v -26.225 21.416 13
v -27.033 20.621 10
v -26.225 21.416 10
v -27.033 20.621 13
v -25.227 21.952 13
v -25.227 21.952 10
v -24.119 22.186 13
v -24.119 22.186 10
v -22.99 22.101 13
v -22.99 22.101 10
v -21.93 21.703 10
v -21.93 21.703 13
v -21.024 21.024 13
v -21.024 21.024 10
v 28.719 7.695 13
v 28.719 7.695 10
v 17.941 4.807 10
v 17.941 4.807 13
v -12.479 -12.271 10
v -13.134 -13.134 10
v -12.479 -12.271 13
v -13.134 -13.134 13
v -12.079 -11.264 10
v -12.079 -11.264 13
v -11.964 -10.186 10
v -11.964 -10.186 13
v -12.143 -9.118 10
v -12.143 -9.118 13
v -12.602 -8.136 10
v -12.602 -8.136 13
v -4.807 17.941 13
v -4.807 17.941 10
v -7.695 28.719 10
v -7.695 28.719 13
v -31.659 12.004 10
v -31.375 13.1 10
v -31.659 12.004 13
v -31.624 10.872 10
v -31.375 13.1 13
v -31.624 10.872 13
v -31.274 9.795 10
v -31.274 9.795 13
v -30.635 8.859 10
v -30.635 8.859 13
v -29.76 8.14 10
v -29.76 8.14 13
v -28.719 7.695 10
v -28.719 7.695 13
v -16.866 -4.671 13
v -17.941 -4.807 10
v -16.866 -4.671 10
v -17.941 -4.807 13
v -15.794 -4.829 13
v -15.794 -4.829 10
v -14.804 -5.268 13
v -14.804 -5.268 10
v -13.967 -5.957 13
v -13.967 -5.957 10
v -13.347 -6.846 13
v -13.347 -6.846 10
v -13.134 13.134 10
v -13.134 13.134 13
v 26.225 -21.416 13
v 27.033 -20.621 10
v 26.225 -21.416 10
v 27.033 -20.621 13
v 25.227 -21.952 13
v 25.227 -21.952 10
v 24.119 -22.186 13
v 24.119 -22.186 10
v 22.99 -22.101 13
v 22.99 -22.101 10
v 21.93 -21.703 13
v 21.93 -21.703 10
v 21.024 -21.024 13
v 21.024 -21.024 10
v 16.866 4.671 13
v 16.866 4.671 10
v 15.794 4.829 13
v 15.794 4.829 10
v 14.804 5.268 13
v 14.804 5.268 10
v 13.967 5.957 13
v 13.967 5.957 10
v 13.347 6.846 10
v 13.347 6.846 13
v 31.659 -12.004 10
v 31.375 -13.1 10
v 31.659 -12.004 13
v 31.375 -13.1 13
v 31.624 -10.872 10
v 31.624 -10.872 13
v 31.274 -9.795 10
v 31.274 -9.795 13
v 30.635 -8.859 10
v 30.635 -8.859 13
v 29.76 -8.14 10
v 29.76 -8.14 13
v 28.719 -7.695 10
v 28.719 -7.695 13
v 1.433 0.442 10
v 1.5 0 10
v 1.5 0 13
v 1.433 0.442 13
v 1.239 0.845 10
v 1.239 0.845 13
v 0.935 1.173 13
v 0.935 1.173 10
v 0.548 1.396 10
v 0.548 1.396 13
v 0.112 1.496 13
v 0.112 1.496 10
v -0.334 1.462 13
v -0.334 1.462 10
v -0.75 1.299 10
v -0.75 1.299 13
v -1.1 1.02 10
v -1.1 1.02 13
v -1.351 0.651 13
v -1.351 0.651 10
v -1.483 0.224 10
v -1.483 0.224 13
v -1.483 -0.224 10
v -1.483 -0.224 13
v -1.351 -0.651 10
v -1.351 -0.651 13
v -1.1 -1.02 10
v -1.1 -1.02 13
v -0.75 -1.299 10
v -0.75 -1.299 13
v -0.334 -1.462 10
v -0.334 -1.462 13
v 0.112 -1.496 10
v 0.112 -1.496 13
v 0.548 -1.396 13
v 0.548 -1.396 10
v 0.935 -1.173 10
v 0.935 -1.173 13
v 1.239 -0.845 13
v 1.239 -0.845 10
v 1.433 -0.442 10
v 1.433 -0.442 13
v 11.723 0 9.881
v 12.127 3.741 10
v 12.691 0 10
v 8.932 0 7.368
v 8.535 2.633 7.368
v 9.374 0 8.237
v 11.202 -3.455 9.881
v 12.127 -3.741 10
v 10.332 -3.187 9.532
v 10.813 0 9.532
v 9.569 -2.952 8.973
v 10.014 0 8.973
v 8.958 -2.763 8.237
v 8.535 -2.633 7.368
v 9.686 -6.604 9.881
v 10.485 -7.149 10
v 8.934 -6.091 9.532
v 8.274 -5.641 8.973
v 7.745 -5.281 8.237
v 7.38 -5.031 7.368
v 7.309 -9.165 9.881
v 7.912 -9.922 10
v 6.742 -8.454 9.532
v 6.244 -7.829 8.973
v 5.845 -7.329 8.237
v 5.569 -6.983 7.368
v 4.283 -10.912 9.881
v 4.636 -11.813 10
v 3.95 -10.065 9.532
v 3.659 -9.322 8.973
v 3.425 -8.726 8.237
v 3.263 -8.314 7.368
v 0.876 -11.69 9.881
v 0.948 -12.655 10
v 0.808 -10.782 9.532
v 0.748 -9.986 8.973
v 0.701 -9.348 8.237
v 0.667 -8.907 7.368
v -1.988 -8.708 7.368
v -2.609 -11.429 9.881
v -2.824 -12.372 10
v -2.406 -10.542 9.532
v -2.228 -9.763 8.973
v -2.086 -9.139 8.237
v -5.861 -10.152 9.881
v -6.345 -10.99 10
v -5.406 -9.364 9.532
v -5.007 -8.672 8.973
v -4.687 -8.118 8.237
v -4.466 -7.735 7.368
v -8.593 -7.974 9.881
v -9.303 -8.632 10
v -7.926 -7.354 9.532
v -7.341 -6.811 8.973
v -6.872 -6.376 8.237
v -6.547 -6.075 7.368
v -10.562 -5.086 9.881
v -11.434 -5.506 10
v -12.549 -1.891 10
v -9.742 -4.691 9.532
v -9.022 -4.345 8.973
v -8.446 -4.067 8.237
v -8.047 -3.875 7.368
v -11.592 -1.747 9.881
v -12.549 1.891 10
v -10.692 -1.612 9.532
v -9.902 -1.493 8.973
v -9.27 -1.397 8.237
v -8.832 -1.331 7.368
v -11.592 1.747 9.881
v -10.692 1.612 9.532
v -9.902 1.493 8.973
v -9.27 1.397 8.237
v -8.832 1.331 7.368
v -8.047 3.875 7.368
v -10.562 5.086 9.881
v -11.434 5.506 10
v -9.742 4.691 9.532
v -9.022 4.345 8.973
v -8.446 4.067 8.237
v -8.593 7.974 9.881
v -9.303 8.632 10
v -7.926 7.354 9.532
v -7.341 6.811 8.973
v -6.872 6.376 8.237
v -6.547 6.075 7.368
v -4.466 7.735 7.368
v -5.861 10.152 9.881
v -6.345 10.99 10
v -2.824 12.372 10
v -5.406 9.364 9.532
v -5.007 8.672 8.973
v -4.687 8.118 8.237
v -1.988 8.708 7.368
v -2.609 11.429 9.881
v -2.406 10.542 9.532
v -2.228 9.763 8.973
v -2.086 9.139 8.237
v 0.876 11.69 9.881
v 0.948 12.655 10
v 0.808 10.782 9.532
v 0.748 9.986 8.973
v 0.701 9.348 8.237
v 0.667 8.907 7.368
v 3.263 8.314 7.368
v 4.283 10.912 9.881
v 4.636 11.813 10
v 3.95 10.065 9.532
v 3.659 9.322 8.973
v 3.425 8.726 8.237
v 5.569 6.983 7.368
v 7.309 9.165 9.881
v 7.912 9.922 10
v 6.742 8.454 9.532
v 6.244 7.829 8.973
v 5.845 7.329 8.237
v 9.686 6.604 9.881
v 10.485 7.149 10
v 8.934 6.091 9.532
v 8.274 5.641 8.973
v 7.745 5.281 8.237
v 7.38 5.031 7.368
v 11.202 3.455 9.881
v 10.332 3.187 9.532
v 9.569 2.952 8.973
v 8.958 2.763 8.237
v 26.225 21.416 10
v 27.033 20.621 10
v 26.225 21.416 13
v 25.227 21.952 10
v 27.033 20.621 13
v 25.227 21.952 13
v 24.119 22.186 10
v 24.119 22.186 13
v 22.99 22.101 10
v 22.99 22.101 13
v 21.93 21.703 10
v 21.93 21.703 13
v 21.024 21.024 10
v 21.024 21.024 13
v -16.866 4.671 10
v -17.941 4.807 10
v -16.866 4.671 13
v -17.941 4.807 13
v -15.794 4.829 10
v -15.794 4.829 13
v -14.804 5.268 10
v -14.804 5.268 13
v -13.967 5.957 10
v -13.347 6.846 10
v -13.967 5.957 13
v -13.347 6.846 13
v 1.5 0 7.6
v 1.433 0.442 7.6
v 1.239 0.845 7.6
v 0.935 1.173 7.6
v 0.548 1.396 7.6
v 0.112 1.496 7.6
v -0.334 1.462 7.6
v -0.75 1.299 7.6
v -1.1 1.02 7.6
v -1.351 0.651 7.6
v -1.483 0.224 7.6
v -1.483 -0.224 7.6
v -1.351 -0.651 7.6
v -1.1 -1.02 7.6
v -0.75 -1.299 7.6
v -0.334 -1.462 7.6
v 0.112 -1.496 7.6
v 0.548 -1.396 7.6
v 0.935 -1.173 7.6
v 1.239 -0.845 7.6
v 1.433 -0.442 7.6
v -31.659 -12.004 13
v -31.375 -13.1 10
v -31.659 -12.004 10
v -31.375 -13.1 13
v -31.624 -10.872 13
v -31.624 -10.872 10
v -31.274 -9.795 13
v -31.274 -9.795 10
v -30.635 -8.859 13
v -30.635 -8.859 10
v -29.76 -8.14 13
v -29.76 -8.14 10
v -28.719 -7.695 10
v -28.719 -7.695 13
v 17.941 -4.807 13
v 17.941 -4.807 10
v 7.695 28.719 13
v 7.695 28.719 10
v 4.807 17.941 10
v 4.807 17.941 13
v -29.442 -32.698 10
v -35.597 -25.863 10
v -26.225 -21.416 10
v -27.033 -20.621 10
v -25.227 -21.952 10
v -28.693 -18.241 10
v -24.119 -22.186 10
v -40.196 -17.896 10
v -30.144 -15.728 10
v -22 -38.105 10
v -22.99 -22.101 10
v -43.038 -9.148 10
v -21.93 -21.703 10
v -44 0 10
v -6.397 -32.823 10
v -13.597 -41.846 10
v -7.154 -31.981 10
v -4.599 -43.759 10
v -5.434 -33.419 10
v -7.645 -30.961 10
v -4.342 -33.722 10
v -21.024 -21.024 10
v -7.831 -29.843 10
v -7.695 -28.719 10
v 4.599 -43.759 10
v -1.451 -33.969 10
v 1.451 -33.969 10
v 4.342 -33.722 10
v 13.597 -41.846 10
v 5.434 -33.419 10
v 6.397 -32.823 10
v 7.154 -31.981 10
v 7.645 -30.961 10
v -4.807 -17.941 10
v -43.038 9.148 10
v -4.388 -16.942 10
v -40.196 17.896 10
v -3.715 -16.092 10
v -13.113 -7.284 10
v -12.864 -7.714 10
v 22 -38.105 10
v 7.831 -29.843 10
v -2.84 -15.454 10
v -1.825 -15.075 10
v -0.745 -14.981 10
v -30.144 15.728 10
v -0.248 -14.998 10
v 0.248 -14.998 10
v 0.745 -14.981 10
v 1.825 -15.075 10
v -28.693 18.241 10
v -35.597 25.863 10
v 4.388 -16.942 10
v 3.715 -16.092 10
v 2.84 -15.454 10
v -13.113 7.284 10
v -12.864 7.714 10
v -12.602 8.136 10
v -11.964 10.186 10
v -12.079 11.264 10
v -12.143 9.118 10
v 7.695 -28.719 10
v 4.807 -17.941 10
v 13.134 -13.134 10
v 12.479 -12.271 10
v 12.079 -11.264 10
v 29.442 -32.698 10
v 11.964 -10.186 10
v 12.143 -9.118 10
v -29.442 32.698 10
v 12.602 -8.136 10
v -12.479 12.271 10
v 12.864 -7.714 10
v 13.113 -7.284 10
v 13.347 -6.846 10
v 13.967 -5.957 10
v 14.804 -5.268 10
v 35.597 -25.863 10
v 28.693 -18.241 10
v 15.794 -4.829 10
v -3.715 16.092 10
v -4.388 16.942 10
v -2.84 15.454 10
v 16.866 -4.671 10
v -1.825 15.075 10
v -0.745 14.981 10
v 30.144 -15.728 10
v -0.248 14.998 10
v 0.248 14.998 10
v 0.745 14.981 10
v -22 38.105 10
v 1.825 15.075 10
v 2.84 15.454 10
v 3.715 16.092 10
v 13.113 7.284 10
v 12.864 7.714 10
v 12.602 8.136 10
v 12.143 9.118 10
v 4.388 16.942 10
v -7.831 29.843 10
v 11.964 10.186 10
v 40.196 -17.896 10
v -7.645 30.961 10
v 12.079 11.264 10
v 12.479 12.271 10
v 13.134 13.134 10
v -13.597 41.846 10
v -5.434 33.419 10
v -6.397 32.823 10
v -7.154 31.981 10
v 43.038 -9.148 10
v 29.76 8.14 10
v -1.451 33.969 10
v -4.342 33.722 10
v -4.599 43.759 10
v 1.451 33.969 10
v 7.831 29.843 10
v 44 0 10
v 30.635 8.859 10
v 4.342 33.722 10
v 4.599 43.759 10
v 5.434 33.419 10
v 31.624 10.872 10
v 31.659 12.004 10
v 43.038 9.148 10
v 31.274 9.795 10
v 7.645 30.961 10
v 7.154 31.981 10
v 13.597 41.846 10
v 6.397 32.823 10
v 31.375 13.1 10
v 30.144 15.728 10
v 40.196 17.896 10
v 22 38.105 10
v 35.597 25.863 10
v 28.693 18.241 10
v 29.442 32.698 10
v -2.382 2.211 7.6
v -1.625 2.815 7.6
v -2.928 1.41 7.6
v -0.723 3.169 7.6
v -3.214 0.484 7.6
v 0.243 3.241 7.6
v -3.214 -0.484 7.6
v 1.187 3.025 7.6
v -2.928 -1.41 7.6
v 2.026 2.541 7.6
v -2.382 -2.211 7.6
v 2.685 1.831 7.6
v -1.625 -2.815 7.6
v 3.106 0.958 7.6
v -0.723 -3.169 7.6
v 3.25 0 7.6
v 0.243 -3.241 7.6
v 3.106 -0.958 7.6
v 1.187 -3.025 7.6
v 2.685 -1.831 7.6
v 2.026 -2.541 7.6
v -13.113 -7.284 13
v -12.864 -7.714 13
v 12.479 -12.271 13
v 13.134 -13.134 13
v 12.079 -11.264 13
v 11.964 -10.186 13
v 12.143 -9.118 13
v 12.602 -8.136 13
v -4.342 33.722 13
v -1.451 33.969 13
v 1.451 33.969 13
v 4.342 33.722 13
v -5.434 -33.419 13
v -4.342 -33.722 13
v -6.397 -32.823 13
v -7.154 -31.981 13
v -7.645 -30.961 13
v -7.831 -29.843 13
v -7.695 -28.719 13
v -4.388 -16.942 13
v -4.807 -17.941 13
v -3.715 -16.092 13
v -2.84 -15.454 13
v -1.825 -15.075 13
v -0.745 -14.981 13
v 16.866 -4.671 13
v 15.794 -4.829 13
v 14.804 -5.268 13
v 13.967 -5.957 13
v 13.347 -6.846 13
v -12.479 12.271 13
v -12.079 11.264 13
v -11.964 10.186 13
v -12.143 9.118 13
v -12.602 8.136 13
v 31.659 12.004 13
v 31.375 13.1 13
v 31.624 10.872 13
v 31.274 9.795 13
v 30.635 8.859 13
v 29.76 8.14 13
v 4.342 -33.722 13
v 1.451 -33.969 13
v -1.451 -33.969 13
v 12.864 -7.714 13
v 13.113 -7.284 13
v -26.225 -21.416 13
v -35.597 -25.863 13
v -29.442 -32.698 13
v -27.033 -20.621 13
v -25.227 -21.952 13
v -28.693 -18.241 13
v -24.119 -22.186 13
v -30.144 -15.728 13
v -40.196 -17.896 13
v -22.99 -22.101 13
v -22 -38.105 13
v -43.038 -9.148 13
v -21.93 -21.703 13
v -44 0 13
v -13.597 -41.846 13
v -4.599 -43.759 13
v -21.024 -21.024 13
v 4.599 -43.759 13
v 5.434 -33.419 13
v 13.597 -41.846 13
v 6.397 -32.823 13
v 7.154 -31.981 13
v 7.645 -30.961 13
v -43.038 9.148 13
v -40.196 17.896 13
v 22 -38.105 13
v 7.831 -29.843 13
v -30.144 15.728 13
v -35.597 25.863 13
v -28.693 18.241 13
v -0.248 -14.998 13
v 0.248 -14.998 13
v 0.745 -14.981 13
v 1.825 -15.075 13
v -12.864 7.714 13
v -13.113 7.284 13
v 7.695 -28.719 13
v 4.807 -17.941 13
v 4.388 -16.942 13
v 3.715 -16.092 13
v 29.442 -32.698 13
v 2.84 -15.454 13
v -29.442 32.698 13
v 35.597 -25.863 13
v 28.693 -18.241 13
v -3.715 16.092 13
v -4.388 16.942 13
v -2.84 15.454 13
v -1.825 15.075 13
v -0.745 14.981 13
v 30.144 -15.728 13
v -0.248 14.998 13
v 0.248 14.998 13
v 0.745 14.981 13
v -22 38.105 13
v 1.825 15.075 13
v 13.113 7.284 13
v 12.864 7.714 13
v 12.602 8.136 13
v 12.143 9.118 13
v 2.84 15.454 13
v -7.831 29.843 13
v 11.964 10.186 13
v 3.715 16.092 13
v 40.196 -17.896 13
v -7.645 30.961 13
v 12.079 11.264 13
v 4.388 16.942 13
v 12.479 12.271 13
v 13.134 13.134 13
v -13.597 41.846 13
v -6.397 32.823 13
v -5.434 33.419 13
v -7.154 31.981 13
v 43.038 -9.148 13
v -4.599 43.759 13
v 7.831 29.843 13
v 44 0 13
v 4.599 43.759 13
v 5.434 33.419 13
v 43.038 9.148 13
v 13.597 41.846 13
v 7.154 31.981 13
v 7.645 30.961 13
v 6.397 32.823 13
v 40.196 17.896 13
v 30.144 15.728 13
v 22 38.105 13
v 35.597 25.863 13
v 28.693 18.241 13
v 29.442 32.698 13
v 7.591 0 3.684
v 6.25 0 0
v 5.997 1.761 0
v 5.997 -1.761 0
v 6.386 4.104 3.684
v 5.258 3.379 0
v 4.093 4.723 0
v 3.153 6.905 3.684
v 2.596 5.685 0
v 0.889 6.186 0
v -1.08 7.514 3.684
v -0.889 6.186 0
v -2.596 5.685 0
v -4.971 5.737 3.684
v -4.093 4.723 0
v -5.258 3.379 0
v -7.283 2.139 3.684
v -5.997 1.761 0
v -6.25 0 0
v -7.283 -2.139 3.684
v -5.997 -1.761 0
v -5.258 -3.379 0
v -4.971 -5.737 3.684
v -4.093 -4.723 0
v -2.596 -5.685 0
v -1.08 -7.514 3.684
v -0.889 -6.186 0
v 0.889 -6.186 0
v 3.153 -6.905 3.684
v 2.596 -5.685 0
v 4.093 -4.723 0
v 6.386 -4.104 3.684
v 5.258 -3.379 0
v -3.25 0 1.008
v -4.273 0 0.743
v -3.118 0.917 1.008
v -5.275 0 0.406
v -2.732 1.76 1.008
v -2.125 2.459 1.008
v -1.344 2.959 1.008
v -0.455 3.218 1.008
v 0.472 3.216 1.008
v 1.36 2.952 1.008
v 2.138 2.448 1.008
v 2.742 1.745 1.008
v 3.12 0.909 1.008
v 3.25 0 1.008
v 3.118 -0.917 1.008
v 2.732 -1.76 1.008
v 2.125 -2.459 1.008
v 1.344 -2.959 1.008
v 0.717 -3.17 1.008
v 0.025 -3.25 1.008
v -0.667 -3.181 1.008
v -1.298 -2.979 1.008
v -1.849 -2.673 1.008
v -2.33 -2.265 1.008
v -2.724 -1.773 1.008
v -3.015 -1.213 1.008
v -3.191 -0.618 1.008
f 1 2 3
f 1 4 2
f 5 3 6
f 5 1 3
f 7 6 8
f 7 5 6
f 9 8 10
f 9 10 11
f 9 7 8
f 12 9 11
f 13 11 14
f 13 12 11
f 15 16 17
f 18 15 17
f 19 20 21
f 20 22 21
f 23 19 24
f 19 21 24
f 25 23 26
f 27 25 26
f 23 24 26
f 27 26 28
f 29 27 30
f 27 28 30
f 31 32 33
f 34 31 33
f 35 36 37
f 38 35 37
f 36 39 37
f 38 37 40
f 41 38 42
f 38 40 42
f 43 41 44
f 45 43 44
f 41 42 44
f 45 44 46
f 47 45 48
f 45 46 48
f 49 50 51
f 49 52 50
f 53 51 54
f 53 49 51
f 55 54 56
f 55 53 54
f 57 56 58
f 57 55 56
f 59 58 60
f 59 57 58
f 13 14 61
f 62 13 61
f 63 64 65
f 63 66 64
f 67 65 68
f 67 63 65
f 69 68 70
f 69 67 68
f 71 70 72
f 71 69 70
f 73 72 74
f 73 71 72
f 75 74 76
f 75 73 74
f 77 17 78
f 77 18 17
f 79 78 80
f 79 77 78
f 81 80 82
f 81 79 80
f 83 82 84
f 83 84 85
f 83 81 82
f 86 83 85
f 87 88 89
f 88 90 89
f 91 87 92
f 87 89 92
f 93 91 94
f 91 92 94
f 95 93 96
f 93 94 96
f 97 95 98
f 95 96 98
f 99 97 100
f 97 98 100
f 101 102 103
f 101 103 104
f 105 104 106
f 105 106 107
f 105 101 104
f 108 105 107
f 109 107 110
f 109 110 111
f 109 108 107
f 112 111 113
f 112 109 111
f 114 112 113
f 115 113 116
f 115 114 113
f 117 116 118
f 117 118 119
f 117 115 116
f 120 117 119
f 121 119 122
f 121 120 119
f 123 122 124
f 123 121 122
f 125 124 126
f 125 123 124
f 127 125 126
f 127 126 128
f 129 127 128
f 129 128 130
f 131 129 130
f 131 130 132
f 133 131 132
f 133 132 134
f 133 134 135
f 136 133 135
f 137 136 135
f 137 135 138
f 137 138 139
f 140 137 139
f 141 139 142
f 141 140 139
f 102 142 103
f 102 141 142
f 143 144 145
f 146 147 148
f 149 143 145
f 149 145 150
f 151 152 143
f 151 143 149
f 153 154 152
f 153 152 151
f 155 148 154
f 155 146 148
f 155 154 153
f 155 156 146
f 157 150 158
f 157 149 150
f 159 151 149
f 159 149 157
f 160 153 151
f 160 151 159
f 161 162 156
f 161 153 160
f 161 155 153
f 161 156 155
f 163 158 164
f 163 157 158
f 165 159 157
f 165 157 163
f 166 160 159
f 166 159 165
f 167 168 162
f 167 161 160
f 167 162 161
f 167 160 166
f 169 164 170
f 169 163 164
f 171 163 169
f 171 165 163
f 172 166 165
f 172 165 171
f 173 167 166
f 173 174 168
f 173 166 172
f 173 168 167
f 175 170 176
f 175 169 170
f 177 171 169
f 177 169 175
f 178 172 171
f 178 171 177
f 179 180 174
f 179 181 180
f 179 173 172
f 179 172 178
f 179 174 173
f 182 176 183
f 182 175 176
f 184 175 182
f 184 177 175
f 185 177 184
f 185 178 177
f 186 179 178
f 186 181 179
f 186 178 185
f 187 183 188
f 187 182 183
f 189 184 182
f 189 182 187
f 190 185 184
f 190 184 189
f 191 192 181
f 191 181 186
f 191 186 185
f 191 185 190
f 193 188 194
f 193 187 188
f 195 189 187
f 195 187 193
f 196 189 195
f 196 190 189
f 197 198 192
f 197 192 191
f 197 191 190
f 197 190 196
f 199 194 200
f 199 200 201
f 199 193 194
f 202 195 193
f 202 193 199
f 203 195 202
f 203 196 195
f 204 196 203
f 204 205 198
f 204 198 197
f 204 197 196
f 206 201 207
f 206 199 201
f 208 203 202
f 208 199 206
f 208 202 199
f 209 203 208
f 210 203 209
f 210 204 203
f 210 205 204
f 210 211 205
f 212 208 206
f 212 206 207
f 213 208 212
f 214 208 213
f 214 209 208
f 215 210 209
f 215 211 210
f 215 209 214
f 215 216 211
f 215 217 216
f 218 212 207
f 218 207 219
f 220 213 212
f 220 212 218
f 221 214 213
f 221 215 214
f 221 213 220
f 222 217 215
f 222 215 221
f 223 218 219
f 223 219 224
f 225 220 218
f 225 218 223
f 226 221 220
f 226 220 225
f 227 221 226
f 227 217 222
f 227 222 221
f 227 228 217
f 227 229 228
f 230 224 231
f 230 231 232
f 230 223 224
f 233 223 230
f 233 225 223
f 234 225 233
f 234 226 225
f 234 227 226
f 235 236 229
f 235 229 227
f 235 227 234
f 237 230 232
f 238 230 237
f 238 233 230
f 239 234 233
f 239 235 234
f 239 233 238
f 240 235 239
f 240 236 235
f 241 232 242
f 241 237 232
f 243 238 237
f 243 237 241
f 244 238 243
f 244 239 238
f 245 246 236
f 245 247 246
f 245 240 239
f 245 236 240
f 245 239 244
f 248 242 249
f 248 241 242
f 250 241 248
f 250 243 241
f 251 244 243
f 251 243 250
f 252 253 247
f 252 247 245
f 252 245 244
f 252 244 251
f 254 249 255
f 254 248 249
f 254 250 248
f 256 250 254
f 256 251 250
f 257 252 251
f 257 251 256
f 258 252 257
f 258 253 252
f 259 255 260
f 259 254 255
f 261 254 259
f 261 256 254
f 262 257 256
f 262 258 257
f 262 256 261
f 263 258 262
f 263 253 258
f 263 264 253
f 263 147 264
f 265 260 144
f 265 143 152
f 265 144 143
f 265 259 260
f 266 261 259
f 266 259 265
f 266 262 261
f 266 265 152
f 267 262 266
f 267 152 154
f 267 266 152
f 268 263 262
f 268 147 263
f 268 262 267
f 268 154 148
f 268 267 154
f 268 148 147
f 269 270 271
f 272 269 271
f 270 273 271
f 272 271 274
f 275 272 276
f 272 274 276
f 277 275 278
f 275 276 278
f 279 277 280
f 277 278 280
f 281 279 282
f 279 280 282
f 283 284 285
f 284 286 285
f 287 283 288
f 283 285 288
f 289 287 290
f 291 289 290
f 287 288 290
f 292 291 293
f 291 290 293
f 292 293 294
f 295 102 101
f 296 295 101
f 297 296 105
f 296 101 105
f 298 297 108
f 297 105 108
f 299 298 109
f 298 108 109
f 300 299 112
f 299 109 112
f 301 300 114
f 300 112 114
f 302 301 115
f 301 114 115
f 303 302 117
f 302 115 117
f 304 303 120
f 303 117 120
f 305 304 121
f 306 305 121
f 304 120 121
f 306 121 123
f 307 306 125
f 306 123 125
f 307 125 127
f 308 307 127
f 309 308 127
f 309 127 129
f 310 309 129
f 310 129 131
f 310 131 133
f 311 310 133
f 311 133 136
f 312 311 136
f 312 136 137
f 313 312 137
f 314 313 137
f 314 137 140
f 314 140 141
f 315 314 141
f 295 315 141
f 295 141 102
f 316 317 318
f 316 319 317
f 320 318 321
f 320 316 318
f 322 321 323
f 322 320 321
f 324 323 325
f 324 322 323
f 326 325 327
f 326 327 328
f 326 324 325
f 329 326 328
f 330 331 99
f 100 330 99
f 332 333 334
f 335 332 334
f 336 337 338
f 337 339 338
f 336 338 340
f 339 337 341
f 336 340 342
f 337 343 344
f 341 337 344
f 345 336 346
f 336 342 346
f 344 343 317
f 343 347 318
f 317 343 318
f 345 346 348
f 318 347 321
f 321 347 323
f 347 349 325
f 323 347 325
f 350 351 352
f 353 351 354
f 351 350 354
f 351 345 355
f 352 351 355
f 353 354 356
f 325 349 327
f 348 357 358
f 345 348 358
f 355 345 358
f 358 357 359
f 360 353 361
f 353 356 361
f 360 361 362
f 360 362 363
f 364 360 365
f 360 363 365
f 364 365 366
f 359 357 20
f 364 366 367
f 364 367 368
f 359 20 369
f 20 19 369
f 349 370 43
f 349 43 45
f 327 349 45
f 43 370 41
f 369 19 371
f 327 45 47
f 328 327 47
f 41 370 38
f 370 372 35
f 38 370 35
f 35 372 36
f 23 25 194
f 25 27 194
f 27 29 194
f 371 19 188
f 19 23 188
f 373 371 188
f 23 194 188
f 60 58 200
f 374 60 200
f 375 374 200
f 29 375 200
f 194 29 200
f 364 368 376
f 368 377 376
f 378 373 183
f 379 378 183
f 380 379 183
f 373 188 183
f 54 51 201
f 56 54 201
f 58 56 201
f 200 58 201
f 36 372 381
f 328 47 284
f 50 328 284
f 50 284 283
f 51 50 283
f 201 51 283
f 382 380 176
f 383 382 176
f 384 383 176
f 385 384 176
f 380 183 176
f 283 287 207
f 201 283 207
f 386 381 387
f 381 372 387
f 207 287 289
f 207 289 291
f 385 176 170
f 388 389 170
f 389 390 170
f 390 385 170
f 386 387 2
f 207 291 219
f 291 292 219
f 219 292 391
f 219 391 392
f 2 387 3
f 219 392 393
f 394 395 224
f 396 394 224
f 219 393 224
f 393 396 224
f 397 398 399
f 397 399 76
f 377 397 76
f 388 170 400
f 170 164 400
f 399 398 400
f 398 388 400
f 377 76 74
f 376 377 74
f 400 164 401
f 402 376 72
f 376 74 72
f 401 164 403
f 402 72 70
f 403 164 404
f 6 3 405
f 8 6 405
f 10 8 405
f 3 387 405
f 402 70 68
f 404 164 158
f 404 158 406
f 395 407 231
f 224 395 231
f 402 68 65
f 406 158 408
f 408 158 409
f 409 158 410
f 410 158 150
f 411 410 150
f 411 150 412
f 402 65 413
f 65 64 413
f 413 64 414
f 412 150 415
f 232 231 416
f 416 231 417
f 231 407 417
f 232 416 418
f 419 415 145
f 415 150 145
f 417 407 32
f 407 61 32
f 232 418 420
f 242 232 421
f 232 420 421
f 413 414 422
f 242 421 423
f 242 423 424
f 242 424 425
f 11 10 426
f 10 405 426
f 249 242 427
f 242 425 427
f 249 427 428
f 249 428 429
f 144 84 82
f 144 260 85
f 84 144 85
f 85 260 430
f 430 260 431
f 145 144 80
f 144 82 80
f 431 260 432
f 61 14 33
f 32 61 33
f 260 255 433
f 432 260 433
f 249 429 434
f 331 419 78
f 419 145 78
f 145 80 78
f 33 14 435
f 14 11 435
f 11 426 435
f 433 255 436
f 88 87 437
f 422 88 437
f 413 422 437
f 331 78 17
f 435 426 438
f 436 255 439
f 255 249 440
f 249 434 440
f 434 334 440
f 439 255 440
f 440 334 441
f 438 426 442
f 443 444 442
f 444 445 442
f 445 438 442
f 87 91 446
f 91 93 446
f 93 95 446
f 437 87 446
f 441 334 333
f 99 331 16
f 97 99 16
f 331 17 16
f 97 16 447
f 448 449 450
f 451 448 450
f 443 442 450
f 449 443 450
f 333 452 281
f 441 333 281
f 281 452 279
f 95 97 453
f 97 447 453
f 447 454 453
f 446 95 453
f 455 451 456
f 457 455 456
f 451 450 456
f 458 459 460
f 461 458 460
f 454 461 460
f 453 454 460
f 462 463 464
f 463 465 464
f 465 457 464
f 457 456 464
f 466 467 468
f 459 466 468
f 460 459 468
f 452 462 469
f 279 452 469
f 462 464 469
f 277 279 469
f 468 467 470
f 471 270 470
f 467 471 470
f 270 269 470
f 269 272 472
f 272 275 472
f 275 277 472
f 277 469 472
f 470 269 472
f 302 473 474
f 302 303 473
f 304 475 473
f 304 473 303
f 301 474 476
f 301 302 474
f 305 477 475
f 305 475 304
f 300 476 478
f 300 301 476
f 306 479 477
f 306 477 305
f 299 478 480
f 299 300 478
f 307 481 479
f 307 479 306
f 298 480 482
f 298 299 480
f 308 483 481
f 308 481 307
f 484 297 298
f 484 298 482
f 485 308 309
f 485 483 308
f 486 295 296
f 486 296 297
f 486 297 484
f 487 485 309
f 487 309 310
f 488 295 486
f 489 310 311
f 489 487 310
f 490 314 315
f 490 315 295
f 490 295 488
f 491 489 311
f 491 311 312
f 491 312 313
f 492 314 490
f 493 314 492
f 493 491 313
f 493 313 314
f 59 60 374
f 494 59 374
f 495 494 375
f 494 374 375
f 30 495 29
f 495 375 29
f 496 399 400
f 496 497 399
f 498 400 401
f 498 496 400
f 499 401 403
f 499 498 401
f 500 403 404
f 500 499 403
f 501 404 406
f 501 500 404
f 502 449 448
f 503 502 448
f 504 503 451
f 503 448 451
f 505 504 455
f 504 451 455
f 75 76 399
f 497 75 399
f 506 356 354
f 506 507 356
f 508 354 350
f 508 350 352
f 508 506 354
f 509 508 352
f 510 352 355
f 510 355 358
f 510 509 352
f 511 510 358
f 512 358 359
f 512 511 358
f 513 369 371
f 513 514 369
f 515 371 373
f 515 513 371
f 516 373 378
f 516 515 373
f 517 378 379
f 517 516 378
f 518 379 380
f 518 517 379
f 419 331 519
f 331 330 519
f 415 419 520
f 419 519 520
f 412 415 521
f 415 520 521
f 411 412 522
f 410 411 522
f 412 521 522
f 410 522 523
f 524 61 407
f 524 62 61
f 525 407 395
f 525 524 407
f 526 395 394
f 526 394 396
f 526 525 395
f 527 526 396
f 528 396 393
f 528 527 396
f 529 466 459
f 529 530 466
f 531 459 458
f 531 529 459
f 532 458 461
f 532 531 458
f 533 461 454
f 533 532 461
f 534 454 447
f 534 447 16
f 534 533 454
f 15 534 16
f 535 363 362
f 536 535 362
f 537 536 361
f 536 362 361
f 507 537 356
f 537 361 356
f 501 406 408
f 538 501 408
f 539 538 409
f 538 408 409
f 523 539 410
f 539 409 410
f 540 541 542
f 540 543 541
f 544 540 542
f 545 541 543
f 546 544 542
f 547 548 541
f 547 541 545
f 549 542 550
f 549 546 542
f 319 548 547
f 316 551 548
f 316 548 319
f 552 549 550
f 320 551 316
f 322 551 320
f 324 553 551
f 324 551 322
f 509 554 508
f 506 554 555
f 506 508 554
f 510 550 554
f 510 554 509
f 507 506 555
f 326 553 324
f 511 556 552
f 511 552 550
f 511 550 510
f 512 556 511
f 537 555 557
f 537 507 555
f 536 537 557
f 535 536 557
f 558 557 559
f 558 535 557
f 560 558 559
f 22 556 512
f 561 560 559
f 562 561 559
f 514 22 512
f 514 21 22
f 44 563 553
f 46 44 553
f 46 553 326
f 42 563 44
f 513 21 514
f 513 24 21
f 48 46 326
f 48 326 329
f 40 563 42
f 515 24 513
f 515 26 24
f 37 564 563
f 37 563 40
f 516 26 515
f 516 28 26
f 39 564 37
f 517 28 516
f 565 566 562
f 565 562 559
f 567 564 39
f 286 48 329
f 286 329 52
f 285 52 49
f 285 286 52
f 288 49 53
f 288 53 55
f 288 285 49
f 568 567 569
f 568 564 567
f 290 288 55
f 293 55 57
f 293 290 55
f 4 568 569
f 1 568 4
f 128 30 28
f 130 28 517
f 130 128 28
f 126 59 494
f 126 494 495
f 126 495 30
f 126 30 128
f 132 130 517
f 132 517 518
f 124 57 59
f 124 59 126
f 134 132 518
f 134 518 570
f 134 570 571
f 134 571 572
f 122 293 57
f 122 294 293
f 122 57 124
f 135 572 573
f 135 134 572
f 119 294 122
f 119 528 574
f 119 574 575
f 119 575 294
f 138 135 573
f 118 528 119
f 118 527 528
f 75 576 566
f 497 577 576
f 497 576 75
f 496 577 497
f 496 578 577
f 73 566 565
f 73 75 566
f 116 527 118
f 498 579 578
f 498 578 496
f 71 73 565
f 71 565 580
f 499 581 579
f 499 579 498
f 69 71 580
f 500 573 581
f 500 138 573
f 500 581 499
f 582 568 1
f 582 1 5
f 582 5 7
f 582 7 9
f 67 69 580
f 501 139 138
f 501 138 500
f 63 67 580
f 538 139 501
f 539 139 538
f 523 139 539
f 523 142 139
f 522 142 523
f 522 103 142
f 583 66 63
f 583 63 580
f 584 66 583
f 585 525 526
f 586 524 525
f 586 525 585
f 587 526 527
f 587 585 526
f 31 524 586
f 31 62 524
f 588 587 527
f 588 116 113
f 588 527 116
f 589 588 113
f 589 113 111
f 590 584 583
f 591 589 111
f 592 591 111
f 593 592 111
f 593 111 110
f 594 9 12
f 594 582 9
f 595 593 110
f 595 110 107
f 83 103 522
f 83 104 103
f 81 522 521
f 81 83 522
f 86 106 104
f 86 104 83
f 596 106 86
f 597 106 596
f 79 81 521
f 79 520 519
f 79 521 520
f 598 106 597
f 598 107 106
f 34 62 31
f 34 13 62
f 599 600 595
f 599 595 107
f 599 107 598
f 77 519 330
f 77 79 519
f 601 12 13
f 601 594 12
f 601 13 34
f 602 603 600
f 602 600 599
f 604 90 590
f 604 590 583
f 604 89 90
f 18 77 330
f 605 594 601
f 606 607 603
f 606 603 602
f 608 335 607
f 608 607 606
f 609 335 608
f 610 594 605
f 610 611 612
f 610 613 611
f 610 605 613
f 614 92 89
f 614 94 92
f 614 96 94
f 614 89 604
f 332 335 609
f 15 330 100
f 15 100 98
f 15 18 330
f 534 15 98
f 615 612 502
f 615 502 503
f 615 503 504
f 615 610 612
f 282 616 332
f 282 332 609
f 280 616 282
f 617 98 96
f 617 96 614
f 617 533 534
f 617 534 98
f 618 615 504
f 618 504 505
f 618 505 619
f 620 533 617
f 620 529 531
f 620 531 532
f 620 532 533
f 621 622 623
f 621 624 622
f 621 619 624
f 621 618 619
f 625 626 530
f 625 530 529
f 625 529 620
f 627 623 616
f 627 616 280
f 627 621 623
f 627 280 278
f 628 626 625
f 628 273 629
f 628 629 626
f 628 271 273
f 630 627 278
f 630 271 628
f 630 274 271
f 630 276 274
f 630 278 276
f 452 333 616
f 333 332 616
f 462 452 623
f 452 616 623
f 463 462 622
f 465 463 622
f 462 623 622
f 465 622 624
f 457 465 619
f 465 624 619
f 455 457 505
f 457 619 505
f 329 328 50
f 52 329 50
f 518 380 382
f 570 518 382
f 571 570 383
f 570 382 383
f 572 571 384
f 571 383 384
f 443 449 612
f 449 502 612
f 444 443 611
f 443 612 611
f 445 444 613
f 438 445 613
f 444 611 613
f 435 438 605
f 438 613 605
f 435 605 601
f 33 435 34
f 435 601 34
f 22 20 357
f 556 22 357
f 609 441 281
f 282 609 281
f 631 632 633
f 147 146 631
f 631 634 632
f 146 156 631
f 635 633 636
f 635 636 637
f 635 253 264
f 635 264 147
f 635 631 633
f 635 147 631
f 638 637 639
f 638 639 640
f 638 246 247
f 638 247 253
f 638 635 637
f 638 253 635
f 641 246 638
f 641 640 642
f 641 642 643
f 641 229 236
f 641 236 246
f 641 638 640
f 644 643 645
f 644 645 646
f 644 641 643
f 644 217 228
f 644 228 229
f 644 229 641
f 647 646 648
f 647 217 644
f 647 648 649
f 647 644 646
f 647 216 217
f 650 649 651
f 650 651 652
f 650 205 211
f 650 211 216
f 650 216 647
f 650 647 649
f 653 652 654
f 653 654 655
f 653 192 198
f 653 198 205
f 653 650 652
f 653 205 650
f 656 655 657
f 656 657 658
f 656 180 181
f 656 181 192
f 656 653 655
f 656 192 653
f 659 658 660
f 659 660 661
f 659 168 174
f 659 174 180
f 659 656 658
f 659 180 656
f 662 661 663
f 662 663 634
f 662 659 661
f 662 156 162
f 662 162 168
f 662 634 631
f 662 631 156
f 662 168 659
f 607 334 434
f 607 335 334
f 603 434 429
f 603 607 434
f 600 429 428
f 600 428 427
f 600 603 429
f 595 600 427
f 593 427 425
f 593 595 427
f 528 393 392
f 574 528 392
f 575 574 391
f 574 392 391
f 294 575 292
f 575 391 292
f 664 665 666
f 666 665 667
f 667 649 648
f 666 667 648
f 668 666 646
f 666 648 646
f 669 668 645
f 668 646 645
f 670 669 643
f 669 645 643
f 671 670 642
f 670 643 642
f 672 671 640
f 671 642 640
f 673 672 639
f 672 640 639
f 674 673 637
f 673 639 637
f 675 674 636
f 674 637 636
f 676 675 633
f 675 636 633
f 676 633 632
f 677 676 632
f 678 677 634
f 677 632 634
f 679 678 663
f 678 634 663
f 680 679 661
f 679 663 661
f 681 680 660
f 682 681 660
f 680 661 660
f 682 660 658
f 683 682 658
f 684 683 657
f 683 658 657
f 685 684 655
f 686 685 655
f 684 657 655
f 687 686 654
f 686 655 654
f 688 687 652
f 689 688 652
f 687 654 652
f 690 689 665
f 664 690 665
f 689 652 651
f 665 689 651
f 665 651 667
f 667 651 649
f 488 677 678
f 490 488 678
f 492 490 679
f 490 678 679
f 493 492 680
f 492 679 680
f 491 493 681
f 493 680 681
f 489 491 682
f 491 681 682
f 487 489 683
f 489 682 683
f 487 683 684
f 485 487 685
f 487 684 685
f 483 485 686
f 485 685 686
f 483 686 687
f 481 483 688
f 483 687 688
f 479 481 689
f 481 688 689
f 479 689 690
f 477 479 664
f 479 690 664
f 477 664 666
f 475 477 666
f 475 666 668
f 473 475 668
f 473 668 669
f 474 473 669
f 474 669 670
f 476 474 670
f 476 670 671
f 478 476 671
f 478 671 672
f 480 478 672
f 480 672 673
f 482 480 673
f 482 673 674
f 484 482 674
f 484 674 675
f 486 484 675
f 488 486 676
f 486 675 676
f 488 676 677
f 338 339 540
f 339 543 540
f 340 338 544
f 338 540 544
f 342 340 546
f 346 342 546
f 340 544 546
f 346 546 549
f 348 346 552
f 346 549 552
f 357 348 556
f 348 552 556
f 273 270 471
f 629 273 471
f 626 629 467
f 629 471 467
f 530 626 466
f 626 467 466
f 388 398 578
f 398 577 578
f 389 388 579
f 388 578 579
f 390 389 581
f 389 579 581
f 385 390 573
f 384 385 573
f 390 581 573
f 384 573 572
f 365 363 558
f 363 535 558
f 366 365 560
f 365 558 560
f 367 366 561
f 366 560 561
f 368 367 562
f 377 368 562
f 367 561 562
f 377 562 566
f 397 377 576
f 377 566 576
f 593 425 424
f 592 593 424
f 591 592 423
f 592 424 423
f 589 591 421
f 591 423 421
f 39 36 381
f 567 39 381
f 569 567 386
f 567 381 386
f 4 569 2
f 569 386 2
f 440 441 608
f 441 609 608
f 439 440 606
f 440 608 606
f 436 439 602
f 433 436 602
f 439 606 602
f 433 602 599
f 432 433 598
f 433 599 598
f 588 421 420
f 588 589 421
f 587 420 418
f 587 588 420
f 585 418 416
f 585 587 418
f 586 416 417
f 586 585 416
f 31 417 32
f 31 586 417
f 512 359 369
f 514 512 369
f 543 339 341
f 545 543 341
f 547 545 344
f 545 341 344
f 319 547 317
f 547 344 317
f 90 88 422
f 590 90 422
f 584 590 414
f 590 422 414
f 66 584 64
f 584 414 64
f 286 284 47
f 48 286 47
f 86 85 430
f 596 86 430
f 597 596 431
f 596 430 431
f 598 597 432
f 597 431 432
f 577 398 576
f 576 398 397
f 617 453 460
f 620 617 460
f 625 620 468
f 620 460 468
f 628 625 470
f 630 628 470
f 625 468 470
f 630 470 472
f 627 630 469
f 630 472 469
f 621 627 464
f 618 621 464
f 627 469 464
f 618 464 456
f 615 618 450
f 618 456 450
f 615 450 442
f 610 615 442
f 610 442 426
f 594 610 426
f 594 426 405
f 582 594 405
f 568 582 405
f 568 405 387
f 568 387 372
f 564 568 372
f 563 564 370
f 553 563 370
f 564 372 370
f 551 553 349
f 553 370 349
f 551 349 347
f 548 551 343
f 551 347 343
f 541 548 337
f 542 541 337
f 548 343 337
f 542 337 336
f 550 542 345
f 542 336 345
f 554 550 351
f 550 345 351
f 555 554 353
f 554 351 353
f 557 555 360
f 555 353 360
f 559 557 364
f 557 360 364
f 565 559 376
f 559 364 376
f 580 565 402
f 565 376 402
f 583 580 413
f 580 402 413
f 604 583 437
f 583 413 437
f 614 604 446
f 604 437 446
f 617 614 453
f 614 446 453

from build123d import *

# Parameters (mm, degrees)
F0_R     = 6.25
F1_DEPTH = 10
F1_TAPER = -20
F2_R     = 3.25
F3_DEPTH = 7.6
F6_R     = 44
F6_R_2   = 9.8897023427
F6_R_3   = 1.5
F7_DEPTH = 3
F8_R     = 4
F9_DEPTH = 25


with BuildPart() as f1:
    # F0 (on Top) → F1 (new body)
    with BuildSketch(Plane.XY):
        Circle(F0_R)
    extrude(amount=F1_DEPTH, taper=F1_TAPER)

    # F2 (on face) → F3 (cut)
    with BuildSketch(Plane(origin=(0, 0, 0), x_dir=(1, 0, 0), z_dir=(0, 0, -1))):
        Circle(F2_R)
    extrude(amount=-F3_DEPTH, mode=Mode.SUBTRACT)

    # F4 (on Front) → F5 (revolve, cut)
    with BuildSketch(Plane.XZ):
        with BuildLine():
            Line((0, 0), (0, 1.3641098567))
            ThreePointArc((0, 1.3641098567), (-3.198565917, 1.0191150111), (-6.25, 0))
            Line((-6.25, 0), (0, 0))
        make_face()
    revolve(axis=Axis((0, 0, -13.6358901433), (0, 0, -1)), mode=Mode.SUBTRACT)

    # F6 (on face) → F7 (join)
    with BuildSketch(Plane.XY.offset(10)):
        Circle(F6_R)
        with BuildLine():
            Line((-32.8414780938, -8.7998475335), (-14.4888873943, -3.8822856765))
            ThreePointArc((-14.4888873943, -3.8822856765), (-12.9903810568, -7.5), (-10.6066017178, -10.6066017178))
            Line((-10.6066017178, -10.6066017178), (-24.0416305603, -24.0416305603))
            ThreePointArc((-24.0416305603, -24.0416305603), (-29.4448637287, -17), (-32.8414780938, -8.7998475335))
        make_face(mode=Mode.SUBTRACT)
        with BuildLine():
            Line((-8.7998475335, -32.8414780938), (-3.8822856765, -14.4888873943))
            ThreePointArc((-3.8822856765, -14.4888873943), (0, -15), (3.8822856765, -14.4888873943))
            Line((3.8822856765, -14.4888873943), (8.7998475335, -32.8414780938))
            ThreePointArc((8.7998475335, -32.8414780938), (0, -34), (-8.7998475335, -32.8414780938))
        make_face(mode=Mode.SUBTRACT)
        with BuildLine():
            Line((24.0416305603, -24.0416305603), (10.6066017178, -10.6066017178))
            ThreePointArc((10.6066017178, -10.6066017178), (12.9903810568, -7.5), (14.4888873943, -3.8822856765))
            Line((14.4888873943, -3.8822856765), (32.8414780938, -8.7998475335))
            ThreePointArc((32.8414780938, -8.7998475335), (29.4448637287, -17), (24.0416305603, -24.0416305603))
        make_face(mode=Mode.SUBTRACT)
        with BuildLine():
            Line((-24.0416305603, 24.0416305603), (-10.6066017178, 10.6066017178))
            ThreePointArc((-10.6066017178, 10.6066017178), (-12.9903810568, 7.5), (-14.4888873943, 3.8822856765))
            Line((-14.4888873943, 3.8822856765), (-32.8414780938, 8.7998475335))
            ThreePointArc((-32.8414780938, 8.7998475335), (-29.4448637287, 17), (-24.0416305603, 24.0416305603))
        make_face(mode=Mode.SUBTRACT)
        Circle(F6_R_2, mode=Mode.SUBTRACT)
        with BuildLine():
            Line((32.8414780938, 8.7998475335), (14.4888873943, 3.8822856765))
            ThreePointArc((14.4888873943, 3.8822856765), (12.9903810568, 7.5), (10.6066017178, 10.6066017178))
            Line((10.6066017178, 10.6066017178), (24.0416305603, 24.0416305603))
            ThreePointArc((24.0416305603, 24.0416305603), (29.4448637287, 17), (32.8414780938, 8.7998475335))
        make_face(mode=Mode.SUBTRACT)
        with BuildLine():
            ThreePointArc((3.8822856765, 14.4888873943), (0, 15), (-3.8822856765, 14.4888873943))
            Line((-3.8822856765, 14.4888873943), (-8.7998475335, 32.8414780938))
            ThreePointArc((-8.7998475335, 32.8414780938), (0, 34), (8.7998475335, 32.8414780938))
            Line((8.7998475335, 32.8414780938), (3.8822856765, 14.4888873943))
        make_face(mode=Mode.SUBTRACT)
        Circle(F6_R_2)
        Circle(F6_R_3, mode=Mode.SUBTRACT)
    extrude(amount=F7_DEPTH)

    # F8
    f8_edges = [f1.edges().sort_by_distance(p)[0] for p in [
        (-9.889702, 0, 10),
        (-10.606602, -10.606602, 11.5),
        (-14.488887, -3.882286, 11.5),
        (-32.841478, -8.799848, 11.5),
        (-24.041631, -24.041631, 11.5),
        (8.799848, -32.841478, 11.5),
        (3.882286, -14.488887, 11.5),
        (-8.799848, 32.841478, 11.5),
        (-24.041631, 24.041631, 11.5),
        (-10.606602, 10.606602, 11.5),
        (32.841478, -8.799848, 11.5),
        (14.488887, -3.882286, 11.5),
        (10.606602, 10.606602, 11.5),
        (-3.882286, -14.488887, 11.5),
        (10.606602, -10.606602, 11.5),
        (24.041631, -24.041631, 11.5),
        (32.841478, 8.799848, 11.5),
        (14.488887, 3.882286, 11.5),
        (3.882286, 14.488887, 11.5),
        (-8.799848, -32.841478, 11.5),
        (-32.841478, 8.799848, 11.5),
        (-14.488887, 3.882286, 11.5),
        (-3.882286, 14.488887, 11.5),
        (8.799848, 32.841478, 11.5),
        (24.041631, 24.041631, 11.5),
    ]]
    fillet(f8_edges, radius=F8_R)

    # F9 (cut): a face of the model
    f9_faces = [f1.faces().sort_by_distance(p)[0] for p in [
        (0, 0, 10),
    ]]
    extrude(f9_faces, amount=-F9_DEPTH, mode=Mode.SUBTRACT)


solid = f1.part
